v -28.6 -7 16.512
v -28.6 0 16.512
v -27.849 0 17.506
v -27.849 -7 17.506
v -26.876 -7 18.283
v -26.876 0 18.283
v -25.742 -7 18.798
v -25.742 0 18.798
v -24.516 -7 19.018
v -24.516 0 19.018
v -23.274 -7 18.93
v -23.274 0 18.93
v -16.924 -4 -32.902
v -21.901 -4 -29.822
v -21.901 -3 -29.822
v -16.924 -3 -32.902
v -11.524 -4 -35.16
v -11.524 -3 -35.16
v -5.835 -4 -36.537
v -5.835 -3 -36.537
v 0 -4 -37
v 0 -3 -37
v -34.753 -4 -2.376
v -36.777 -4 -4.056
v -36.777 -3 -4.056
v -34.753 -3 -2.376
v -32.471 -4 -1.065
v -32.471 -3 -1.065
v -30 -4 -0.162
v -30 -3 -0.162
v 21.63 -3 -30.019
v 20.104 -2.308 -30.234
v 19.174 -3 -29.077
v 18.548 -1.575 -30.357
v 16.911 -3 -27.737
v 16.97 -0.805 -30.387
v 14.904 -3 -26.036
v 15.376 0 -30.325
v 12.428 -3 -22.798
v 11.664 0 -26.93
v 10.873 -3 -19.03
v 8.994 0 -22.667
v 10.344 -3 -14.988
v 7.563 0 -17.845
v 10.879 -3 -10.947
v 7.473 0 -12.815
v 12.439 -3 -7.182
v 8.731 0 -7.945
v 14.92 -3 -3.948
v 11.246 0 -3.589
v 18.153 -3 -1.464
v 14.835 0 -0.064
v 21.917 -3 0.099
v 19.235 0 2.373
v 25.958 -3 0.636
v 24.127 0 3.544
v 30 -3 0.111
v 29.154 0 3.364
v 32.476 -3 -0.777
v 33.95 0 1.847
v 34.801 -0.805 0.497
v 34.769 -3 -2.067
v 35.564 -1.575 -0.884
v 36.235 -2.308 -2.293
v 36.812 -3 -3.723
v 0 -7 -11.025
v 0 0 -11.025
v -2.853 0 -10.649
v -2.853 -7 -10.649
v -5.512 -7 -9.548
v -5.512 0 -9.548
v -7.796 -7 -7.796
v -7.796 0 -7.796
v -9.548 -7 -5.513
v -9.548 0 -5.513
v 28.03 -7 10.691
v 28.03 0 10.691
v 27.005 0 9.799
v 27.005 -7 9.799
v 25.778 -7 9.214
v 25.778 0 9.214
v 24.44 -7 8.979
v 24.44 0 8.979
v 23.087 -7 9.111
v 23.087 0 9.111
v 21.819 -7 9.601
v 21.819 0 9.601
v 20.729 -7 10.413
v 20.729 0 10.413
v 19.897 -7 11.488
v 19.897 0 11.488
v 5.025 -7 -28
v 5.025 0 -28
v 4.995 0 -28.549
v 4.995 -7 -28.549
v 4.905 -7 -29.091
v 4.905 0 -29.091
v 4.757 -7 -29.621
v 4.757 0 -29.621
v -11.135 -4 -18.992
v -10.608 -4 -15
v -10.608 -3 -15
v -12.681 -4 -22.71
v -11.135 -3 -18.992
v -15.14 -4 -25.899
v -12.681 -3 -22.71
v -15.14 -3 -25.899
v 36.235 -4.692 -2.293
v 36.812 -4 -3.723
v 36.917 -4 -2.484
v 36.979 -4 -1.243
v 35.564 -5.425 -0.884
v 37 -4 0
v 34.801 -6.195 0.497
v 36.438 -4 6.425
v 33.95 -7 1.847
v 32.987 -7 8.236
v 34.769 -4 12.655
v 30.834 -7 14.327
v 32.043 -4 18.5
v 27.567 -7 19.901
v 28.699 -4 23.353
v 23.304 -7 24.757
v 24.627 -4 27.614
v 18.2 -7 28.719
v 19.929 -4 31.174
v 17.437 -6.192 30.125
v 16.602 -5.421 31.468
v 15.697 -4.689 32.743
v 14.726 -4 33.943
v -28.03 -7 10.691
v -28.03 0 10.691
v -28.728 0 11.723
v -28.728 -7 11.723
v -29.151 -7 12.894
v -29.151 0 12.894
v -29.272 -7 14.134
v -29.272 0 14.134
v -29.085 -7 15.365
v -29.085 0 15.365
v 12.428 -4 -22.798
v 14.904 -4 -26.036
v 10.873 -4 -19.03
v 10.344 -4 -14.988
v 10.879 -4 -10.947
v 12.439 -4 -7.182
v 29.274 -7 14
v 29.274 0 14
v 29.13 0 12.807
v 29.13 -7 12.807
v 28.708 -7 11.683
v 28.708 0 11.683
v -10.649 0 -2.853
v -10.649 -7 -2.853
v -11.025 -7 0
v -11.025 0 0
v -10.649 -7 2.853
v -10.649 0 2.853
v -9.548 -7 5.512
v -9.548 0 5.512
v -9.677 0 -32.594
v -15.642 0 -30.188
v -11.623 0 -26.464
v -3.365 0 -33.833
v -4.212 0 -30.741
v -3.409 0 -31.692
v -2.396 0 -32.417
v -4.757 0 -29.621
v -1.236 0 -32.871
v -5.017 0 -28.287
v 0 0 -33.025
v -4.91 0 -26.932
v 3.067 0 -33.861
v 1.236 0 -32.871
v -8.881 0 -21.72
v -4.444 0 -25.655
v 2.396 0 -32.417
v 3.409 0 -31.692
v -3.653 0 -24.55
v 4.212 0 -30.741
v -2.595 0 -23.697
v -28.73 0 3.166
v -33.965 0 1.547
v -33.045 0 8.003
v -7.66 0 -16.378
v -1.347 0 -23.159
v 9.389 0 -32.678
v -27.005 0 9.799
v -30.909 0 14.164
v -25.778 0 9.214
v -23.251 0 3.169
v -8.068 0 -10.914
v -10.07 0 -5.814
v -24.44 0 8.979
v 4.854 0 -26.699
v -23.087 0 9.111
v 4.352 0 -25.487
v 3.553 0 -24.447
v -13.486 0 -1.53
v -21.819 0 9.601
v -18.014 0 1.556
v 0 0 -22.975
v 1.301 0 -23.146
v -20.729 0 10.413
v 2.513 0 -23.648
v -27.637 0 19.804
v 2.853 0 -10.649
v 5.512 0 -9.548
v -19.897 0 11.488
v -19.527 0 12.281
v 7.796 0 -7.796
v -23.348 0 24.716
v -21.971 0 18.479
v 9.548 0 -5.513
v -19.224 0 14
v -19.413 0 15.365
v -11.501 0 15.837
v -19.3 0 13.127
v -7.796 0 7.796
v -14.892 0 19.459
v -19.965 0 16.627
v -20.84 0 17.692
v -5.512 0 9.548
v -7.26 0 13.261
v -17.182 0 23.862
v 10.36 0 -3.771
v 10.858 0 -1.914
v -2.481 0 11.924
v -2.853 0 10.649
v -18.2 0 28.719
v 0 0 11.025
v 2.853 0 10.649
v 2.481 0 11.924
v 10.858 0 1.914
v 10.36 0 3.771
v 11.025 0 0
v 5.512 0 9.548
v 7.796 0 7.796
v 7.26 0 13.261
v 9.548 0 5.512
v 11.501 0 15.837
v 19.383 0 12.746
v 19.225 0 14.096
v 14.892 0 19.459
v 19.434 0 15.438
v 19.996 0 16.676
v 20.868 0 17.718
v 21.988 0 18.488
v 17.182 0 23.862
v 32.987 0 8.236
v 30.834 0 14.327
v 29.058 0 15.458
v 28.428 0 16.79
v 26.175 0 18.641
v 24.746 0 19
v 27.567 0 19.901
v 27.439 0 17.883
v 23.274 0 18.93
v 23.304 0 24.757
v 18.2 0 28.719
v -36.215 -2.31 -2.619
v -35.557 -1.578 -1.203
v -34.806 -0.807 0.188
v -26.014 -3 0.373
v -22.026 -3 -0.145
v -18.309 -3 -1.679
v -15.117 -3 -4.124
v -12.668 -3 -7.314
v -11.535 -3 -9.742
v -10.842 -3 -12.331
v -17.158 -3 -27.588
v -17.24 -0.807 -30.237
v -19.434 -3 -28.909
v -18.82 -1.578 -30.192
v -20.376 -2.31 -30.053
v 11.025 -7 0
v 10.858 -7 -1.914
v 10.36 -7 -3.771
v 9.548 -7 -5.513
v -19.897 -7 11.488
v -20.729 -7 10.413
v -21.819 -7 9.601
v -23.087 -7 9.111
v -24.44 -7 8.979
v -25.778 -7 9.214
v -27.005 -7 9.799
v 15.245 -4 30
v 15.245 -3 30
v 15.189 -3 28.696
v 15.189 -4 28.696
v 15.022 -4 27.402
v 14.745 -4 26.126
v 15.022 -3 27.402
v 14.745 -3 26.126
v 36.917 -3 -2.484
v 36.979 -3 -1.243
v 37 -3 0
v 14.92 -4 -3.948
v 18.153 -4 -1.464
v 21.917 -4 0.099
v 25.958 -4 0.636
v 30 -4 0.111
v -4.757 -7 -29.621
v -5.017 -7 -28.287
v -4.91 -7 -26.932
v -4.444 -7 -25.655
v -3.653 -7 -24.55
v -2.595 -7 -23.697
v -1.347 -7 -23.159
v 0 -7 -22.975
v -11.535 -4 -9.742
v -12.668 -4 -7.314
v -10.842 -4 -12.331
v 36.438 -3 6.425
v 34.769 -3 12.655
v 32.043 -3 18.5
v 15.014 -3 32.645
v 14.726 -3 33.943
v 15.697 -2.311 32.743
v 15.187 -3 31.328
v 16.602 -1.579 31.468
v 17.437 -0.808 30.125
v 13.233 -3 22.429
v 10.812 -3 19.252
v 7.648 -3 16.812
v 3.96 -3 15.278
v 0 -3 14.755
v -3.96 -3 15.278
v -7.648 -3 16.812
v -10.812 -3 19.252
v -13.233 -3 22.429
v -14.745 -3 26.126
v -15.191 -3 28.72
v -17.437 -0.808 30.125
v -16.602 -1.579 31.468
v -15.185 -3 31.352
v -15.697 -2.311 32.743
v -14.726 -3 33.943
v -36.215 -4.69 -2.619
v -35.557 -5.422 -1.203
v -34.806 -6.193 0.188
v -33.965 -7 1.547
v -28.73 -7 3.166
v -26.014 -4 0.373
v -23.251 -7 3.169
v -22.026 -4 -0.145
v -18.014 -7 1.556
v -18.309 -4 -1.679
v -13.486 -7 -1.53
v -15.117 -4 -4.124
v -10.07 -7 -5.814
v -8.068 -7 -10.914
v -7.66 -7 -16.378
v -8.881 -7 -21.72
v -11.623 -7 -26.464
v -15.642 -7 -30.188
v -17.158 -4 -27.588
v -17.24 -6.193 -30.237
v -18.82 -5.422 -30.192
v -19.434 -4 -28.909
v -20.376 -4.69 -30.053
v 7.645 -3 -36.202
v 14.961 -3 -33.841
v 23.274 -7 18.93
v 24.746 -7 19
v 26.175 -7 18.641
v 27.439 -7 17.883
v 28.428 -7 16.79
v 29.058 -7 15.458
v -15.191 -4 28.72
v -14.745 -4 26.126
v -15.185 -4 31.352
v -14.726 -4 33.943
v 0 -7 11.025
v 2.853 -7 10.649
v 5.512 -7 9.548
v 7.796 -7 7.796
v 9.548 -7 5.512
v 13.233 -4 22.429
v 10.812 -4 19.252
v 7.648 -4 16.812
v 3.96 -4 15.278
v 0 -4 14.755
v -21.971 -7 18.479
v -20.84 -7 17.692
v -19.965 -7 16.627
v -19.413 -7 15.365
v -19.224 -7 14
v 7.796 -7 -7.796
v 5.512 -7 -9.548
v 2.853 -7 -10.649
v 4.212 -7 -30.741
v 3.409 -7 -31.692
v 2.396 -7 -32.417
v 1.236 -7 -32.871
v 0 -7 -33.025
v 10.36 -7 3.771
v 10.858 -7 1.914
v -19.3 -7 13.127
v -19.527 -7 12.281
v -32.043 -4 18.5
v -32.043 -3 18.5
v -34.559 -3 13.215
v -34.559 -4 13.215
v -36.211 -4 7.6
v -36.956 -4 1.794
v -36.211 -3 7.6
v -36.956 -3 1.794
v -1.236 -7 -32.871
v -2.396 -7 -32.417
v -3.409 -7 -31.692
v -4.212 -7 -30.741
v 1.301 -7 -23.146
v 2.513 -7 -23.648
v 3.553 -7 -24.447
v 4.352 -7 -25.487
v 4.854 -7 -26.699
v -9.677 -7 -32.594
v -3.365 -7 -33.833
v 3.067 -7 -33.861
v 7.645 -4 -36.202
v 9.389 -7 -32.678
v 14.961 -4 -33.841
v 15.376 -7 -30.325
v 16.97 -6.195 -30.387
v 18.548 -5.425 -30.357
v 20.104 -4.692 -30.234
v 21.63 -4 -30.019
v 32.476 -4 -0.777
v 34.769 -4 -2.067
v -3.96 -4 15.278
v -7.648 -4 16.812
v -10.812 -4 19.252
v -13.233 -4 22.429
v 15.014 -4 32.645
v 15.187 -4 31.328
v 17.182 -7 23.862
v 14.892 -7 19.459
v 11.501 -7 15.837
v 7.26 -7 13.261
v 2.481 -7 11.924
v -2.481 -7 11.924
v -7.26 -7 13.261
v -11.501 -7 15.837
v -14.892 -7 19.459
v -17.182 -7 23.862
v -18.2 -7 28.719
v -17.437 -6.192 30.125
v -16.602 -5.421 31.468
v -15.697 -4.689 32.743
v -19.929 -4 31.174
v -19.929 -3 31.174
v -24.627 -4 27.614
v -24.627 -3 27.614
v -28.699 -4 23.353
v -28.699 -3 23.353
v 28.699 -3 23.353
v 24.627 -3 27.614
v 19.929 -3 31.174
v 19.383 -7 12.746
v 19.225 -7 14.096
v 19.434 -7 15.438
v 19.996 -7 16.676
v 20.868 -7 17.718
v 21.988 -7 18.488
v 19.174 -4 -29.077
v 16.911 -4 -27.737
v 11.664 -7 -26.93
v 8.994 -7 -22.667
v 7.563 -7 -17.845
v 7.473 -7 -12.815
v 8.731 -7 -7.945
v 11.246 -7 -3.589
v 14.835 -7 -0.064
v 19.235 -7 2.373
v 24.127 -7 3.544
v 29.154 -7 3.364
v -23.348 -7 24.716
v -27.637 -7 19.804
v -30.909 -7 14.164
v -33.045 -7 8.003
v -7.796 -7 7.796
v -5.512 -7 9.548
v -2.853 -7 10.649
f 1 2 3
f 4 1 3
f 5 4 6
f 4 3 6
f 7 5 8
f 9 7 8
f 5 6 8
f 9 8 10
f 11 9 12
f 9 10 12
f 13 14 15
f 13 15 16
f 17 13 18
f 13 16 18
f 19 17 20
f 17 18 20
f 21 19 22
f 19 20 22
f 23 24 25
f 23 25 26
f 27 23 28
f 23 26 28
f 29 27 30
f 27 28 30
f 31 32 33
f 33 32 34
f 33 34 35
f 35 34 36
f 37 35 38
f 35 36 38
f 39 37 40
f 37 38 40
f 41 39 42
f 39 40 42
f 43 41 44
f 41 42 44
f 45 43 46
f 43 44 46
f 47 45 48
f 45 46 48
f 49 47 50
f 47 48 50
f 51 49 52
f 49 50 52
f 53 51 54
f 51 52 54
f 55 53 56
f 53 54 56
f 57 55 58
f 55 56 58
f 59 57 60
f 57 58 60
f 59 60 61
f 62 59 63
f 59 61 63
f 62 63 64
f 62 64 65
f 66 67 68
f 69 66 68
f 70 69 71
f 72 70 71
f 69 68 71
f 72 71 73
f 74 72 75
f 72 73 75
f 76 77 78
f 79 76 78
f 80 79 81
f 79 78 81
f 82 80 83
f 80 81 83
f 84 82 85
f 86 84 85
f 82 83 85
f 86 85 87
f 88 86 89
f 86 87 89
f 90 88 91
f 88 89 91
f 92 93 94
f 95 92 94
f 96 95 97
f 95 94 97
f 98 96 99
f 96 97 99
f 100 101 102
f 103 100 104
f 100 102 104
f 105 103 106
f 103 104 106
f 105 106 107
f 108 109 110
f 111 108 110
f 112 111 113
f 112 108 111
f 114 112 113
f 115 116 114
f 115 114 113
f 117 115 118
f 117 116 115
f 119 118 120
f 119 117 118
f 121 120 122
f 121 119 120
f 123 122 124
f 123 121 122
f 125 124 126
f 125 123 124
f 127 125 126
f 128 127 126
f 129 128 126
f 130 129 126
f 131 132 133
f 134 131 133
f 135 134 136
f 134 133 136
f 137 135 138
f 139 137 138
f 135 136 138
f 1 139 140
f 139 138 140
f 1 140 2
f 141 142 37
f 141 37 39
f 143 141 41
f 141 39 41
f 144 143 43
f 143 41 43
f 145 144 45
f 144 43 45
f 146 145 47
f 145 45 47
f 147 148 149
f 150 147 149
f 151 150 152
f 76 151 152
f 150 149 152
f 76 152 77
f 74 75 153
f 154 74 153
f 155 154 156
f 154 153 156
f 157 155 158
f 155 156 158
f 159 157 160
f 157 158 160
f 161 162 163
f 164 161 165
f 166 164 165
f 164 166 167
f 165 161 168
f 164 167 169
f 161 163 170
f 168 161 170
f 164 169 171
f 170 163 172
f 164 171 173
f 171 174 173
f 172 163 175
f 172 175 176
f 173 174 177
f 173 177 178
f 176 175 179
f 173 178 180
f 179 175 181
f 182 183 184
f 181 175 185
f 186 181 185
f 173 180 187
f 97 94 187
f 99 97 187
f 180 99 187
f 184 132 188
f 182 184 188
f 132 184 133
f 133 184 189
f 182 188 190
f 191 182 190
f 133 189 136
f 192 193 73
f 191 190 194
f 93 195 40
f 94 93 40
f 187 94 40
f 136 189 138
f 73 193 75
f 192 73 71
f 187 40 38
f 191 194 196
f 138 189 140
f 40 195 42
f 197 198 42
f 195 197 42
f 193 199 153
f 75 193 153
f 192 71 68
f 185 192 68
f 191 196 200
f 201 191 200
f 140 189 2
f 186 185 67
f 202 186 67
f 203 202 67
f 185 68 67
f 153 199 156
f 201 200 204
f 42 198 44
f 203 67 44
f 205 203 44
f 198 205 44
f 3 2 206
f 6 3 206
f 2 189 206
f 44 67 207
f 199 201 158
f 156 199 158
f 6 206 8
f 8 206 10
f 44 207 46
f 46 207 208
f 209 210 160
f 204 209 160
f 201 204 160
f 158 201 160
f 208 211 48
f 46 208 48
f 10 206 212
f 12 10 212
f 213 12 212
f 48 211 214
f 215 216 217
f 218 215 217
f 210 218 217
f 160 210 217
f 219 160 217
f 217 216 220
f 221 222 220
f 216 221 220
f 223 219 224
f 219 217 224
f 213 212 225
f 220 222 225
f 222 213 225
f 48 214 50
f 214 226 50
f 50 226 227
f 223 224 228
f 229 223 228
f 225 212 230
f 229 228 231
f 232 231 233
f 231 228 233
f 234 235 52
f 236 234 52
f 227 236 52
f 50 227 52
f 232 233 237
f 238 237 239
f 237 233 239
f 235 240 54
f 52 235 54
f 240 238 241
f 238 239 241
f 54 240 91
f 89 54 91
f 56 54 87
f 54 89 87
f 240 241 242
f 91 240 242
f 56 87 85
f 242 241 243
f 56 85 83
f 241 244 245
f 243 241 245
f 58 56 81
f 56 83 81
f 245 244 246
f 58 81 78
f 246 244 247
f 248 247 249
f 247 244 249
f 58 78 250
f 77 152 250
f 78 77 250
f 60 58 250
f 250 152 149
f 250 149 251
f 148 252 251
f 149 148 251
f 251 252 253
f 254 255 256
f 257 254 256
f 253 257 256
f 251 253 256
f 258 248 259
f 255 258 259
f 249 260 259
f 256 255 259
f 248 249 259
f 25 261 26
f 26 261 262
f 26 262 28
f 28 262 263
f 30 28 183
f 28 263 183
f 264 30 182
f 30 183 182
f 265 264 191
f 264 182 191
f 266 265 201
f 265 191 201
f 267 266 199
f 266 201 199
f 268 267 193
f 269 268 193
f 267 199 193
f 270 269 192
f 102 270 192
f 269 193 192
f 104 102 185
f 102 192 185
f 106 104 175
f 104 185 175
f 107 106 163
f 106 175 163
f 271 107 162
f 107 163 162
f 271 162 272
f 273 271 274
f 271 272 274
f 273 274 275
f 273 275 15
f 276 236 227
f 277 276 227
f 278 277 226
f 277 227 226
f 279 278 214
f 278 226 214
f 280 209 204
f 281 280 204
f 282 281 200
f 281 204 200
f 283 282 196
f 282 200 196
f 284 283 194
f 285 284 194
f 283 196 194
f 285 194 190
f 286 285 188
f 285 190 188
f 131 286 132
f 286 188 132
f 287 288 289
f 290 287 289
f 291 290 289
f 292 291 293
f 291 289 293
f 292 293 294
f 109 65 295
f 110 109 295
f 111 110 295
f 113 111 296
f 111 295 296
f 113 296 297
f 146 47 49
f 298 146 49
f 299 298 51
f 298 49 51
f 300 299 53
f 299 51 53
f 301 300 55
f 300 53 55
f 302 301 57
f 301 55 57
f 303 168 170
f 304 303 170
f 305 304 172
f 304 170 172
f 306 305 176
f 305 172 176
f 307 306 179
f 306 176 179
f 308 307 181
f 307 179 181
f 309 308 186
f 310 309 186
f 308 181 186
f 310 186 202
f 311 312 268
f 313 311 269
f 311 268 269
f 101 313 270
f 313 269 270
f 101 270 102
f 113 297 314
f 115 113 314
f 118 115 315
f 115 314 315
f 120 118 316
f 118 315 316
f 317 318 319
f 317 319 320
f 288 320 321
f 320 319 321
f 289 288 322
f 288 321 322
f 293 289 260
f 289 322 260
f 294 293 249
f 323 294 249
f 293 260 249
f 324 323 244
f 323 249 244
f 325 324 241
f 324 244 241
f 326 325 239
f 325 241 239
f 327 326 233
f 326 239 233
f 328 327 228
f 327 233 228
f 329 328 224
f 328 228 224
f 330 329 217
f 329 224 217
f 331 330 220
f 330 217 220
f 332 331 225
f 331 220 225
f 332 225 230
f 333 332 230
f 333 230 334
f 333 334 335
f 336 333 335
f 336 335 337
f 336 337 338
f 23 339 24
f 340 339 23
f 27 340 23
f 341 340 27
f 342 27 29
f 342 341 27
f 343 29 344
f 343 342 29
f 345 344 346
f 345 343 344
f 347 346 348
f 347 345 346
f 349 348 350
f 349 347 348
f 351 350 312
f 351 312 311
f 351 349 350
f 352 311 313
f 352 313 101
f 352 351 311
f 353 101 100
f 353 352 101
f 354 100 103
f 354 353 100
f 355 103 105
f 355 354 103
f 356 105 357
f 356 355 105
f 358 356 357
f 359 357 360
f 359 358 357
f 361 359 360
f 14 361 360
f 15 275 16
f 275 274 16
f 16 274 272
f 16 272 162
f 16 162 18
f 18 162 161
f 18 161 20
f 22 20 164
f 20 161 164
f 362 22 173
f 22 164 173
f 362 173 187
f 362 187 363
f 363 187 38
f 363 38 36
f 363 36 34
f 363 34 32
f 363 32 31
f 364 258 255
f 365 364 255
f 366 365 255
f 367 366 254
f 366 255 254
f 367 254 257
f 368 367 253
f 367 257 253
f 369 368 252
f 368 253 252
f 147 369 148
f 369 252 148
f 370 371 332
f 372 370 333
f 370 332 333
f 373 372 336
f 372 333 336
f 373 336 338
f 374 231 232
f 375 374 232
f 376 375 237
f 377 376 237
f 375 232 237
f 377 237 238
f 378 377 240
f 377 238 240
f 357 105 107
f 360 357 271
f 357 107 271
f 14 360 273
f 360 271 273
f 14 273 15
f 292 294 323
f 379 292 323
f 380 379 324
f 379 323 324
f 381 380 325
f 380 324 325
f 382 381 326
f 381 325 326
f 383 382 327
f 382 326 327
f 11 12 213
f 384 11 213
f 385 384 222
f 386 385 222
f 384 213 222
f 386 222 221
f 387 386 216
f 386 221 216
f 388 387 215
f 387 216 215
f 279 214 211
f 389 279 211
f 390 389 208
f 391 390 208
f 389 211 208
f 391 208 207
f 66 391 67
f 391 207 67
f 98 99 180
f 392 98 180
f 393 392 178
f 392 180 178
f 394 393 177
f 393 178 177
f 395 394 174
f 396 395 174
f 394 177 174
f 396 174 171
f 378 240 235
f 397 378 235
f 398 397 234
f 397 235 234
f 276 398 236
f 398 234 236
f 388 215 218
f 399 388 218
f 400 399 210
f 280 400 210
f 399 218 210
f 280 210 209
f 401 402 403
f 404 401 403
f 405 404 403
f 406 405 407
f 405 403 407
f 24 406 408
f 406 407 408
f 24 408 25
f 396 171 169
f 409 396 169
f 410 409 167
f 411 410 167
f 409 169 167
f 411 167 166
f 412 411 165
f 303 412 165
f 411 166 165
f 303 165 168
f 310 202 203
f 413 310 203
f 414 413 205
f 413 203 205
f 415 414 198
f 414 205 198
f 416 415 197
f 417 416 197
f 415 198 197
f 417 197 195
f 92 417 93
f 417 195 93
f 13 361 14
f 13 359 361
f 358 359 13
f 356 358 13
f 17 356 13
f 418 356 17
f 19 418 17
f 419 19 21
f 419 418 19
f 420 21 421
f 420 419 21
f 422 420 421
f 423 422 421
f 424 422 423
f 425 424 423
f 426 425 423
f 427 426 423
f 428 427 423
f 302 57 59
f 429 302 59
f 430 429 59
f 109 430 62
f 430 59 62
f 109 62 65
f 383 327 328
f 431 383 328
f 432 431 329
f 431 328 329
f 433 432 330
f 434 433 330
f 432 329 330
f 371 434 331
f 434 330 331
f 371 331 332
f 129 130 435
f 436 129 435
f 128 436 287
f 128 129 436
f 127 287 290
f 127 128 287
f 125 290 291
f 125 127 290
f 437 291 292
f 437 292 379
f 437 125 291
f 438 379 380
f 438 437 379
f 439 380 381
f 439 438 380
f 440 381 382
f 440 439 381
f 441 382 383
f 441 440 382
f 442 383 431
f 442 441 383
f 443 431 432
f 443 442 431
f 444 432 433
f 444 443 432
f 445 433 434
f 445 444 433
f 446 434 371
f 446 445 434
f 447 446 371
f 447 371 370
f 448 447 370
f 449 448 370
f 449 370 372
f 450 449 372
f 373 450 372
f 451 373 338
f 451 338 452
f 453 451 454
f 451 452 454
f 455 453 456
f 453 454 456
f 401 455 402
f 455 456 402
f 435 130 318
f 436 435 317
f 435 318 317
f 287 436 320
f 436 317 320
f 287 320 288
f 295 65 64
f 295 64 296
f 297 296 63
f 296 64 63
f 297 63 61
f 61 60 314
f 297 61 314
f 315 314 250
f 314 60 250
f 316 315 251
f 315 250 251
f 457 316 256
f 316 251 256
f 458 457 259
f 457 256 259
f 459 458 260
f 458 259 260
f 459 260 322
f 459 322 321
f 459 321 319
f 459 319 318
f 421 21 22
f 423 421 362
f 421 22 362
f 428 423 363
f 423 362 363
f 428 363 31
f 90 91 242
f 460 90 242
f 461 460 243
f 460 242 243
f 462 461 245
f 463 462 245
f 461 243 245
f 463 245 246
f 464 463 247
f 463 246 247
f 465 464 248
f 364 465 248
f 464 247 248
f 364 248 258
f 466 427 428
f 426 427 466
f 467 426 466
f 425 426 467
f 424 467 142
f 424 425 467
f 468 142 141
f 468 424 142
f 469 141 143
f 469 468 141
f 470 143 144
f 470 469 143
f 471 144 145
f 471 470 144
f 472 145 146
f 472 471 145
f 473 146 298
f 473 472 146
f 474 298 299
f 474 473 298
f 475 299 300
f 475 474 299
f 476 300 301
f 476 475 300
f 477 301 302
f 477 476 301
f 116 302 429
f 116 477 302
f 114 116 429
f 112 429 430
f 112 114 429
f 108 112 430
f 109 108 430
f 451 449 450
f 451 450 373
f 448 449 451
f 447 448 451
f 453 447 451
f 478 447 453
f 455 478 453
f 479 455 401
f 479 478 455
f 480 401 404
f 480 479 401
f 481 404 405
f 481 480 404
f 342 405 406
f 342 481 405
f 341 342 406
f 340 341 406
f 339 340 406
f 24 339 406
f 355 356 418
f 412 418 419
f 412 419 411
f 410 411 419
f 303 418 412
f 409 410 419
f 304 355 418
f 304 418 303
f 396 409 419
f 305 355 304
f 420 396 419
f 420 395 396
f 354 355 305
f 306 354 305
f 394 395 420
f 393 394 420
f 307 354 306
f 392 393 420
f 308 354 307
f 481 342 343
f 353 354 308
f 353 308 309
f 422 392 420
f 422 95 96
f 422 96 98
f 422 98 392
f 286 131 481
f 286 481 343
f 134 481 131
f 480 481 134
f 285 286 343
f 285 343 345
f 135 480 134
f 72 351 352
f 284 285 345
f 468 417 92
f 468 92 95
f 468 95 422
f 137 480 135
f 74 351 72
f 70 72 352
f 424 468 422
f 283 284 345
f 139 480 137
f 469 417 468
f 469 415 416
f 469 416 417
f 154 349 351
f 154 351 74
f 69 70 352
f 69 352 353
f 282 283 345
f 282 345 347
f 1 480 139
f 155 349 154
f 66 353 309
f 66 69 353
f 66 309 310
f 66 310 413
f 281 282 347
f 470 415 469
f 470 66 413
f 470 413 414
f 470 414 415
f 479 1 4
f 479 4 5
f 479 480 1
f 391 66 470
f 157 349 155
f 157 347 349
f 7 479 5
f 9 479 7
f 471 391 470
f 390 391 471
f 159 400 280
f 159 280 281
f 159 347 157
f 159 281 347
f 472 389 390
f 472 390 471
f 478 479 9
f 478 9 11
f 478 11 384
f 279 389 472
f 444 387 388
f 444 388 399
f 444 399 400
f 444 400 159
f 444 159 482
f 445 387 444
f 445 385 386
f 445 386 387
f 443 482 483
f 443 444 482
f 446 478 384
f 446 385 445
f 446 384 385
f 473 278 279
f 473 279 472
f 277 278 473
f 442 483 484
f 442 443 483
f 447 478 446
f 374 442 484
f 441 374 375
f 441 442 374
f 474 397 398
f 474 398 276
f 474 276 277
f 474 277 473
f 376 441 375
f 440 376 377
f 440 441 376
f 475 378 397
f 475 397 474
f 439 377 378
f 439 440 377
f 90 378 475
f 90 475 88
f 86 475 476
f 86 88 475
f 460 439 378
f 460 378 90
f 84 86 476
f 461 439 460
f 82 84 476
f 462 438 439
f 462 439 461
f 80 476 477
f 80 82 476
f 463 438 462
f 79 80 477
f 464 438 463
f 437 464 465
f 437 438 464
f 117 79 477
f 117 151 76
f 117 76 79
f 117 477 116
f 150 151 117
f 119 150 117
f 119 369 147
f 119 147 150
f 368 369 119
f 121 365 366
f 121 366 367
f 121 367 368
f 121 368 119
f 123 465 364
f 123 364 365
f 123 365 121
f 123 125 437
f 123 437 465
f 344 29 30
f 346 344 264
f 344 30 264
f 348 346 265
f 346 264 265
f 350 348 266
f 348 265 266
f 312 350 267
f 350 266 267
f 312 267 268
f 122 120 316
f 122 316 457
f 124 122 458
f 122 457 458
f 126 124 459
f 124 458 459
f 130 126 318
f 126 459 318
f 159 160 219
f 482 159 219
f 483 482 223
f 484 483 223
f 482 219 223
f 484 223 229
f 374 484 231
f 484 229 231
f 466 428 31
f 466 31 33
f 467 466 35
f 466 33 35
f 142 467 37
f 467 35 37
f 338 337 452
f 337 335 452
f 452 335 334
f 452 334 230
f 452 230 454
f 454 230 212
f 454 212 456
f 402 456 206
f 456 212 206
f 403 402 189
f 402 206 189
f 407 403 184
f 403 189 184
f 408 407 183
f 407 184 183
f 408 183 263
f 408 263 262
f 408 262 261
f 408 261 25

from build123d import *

# Parameters (mm, degrees)
F1_DEPTH     = 7
F2_T2_ANGLE  = 96.7405372454
F2_T4_ANGLE  = 266.8582437325
F2_T6_ANGLE  = 95.969109219
F2_T8_ANGLE  = 264.3512540772
F2_T10_ANGLE = 268.0965177518
F2_T12_ANGLE = 96.2209043171
F2_T14_ANGLE = 96.2209043171
F2_T16_ANGLE = 264.3512540772
F2_T18_ANGLE = 95.969109219
F2_T20_ANGLE = 266.8582437325
F2_T22_ANGLE = 96.7405372454
F2_T24_ANGLE = 268.0965177518


# Not quite as in the source:
# - a fillet or chamfer that OpenCascade refuses, or shapes differently, is made with other operations: its cross-section is extruded or revolved along the edge and cut away or added


with BuildPart() as f1:
    # F0 (on Front) → F1 (new body)
    with BuildSketch(Plane.XZ):
        with BuildLine():
            Line((-28.60048896, 16.5125), (-32.04293994, 18.5))
            ThreePointArc((-32.04293994, 18.5), (-36.2110940276, 7.5997808734), (-36.7769641036, -4.0564653732))
            ThreePointArc((-36.7769641036, -4.0564653732), (-33.6399342951, -1.6712337769), (-29.9995629467, -0.1619351868))
            ThreePointArc((-29.9995629467, -0.1619351868), (-29.5180509711, 5.3558068364), (-28.030388979, 10.6909912395))
            ThreePointArc((-28.030388979, 10.6909912395), (-29.2497876853, 13.5102449097), (-28.60048896, 16.5125))
        make_face()
        with BuildLine():
            ThreePointArc((-28.030388979, 10.6909912395), (-29.5180509711, 5.3558068364), (-29.9995629467, -0.1619351868))
            ThreePointArc((-29.9995629467, -0.1619351868), (-20.1170678219, -0.7895806962), (-12.6676409298, -7.3136659008))
            Line((-12.6676409298, -7.3136659008), (-9.5479300767, -5.5125))
            ThreePointArc((-9.5479300767, -5.5125), (-11.025, 0), (-9.5479300767, 5.5125))
            Line((-9.5479300767, 5.5125), (-19.8969336519, 11.4875))
            ThreePointArc((-19.8969336519, 11.4875), (-23.7589562157, 8.9989236207), (-28.030388979, 10.6909912395))
        make_face()
        with BuildLine():
            ThreePointArc((0, 14.7547752324), (-9.310283358, 17.9279039927), (-14.7448970108, 26.1263853631))
            ThreePointArc((-14.7448970108, 26.1263853631), (-19.3469694385, 22.9280346638), (-23.2738644946, 18.9295333141))
            ThreePointArc((-23.2738644946, 18.9295333141), (-20.3661071395, 17.1899858756), (-19.223711306, 14))
            ThreePointArc((-19.223711306, 14), (-19.3949340289, 12.6994342984), (-19.8969336519, 11.4875))
            Line((-19.8969336519, 11.4875), (-9.5479300767, 5.5125))
            ThreePointArc((-9.5479300767, 5.5125), (-5.5125, 9.5479300767), (0, 11.025))
            Line((0, 11.025), (0, 14.7547752324))
        make_face()
        with BuildLine():
            ThreePointArc((-14.7448970108, 26.1263853631), (-15.2451824532, 30.0359191128), (-14.726480194, 33.9430520298))
            ThreePointArc((-14.726480194, 33.9430520298), (-24.6265431784, 27.6140067915), (-32.04293994, 18.5))
            Line((-32.04293994, 18.5), (-28.60048896, 16.5125))
            ThreePointArc((-28.60048896, 16.5125), (-26.3251091458, 18.5759367359), (-23.2738644946, 18.9295333141))
            ThreePointArc((-23.2738644946, 18.9295333141), (-19.3469694385, 22.9280346638), (-14.7448970108, 26.1263853631))
        make_face()
        with BuildLine():
            ThreePointArc((19.8969336519, 11.4875), (19.6727745701, 16.0763978398), (23.2738644946, 18.9295333141))
            ThreePointArc((23.2738644946, 18.9295333141), (19.3469694385, 22.9280346638), (14.7448970108, 26.1263853631))
            ThreePointArc((14.7448970108, 26.1263853631), (9.310283358, 17.9279039927), (0, 14.7547752324))
            Line((0, 14.7547752324), (0, 11.025))
            ThreePointArc((0, 11.025), (5.5125, 9.5479300767), (9.5479300767, 5.5125))
            Line((9.5479300767, 5.5125), (19.8969336519, 11.4875))
        make_face()
        with BuildLine():
            Line((28.60048896, 16.5125), (32.04293994, 18.5))
            ThreePointArc((32.04293994, 18.5), (24.6265431784, 27.6140067915), (14.726480194, 33.9430520298))
            ThreePointArc((14.726480194, 33.9430520298), (15.1149822826, 31.9885142218), (15.2452247676, 30))
            ThreePointArc((15.2452247676, 30), (15.1196254471, 28.0471035473), (14.7448970108, 26.1263853631))
            ThreePointArc((14.7448970108, 26.1263853631), (19.3469694385, 22.9280346638), (23.2738644946, 18.9295333141))
            ThreePointArc((23.2738644946, 18.9295333141), (26.3251091458, 18.5759367359), (28.60048896, 16.5125))
        make_face()
        with BuildLine():
            ThreePointArc((36.8122346311, -3.7228190211), (36.9530288431, -1.8637755563), (37, 0))
            ThreePointArc((37, 0), (35.7392555727, 9.5763046688), (32.04293994, 18.5))
            Line((32.04293994, 18.5), (28.60048896, 16.5125))
            ThreePointArc((28.60048896, 16.5125), (29.1024885831, 15.3005657016), (29.273711306, 14))
            ThreePointArc((29.273711306, 14), (28.9526221952, 12.2325590968), (28.030388979, 10.6909912395))
            ThreePointArc((28.030388979, 10.6909912395), (29.4933804082, 5.4900375314), (29.9997945679, 0.1110219992))
            ThreePointArc((29.9997945679, 0.1110219992), (33.6494620505, -1.3733111503), (36.8122346311, -3.7228190211))
        make_face()
        with BuildLine():
            ThreePointArc((12.4392811828, -7.1818223394), (19.983625223, -0.5594336383), (29.9997945679, 0.1110219992))
            ThreePointArc((29.9997945679, 0.1110219992), (29.4933804082, 5.4900375314), (28.030388979, 10.6909912395))
            ThreePointArc((28.030388979, 10.6909912395), (23.7589562157, 8.9989236207), (19.8969336519, 11.4875))
            Line((19.8969336519, 11.4875), (9.5479300767, 5.5125))
            ThreePointArc((9.5479300767, 5.5125), (10.6493322348, 2.8534799723), (11.025, 0))
            ThreePointArc((11.025, 0), (10.6493322348, -2.8534799723), (9.5479300767, -5.5125))
            Line((9.5479300767, -5.5125), (12.4392811828, -7.1818223394))
        make_face()
        with BuildLine():
            ThreePointArc((4.7565244845, -29.6205245536), (9.9921782342, -28.2870354427), (14.9037494122, -26.0360952037))
            ThreePointArc((14.9037494122, -26.0360952037), (10.476296354, -17.0266102837), (12.4392811828, -7.1818223394))
            Line((12.4392811828, -7.1818223394), (9.5479300767, -5.5125))
            ThreePointArc((9.5479300767, -5.5125), (5.5125, -9.5479300767), (0, -11.025))
            Line((0, -11.025), (0, -22.975))
            ThreePointArc((0, -22.975), (3.5532115755, -24.4467884245), (5.025, -28))
            ThreePointArc((5.025, -28), (4.9574267788, -28.8213067227), (4.7565244845, -29.6205245536))
        make_face()
        with BuildLine():
            ThreePointArc((-10.6080939152, -15), (-11.7862202639, -20.9020258568), (-15.1400214589, -25.8994160209))
            ThreePointArc((-15.1400214589, -25.8994160209), (-10.1207607074, -28.2412854294), (-4.7565244845, -29.6205245536))
            ThreePointArc((-4.7565244845, -29.6205245536), (-4.0861816456, -25.0753214605), (0, -22.975))
            Line((0, -22.975), (0, -11.025))
            ThreePointArc((0, -11.025), (-5.5125, -9.5479300767), (-9.5479300767, -5.5125))
            Line((-9.5479300767, -5.5125), (-12.6676409298, -7.3136659008))
            ThreePointArc((-12.6676409298, -7.3136659008), (-11.1319048818, -11.0212606962), (-10.6080939152, -15))
        make_face()
        with BuildLine():
            ThreePointArc((-21.9014841146, -29.8215525011), (-11.5239437142, -35.1596177634), (0, -37))
            Line((0, -37), (0, -33.025))
            ThreePointArc((0, -33.025), (-2.9246785395, -32.0861816456), (-4.7565244845, -29.6205245536))
            ThreePointArc((-4.7565244845, -29.6205245536), (-10.1207607074, -28.2412854294), (-15.1400214589, -25.8994160209))
            ThreePointArc((-15.1400214589, -25.8994160209), (-18.267298054, -28.2974207927), (-21.9014841146, -29.8215525011))
        make_face()
        with BuildLine():
            ThreePointArc((0, -37), (11.3644165831, -35.2115043093), (21.6301731615, -30.0189208501))
            ThreePointArc((21.6301731615, -30.0189208501), (18.0140533687, -28.4546333842), (14.9037494122, -26.0360952037))
            ThreePointArc((14.9037494122, -26.0360952037), (9.9921782342, -28.2870354427), (4.7565244845, -29.6205245536))
            ThreePointArc((4.7565244845, -29.6205245536), (2.9246785395, -32.0861816456), (0, -33.025))
            Line((0, -33.025), (0, -37))
        make_face()
    extrude(amount=F1_DEPTH)

    # F2: chamfer of 3 on 12 edges, made by hand

    # F2_s1 → F2_t2 (revolve, cut)
    with BuildSketch(Plane(origin=(0, 0, 0), x_dir=(0, 1, 0), z_dir=(0.9799112872, 0, 0.199433872))):
        Polygon((-4, 37), (-7, 34), (-7, 37), align=None)
    revolve(axis=Axis((0, -7, 0), (0, -1, 0)), revolution_arc=F2_T2_ANGLE, mode=Mode.SUBTRACT)

    # F2_s3 → F2_t4 (revolve, cut)
    with BuildSketch(Plane(origin=(-6.2136111397, 0, -20.8819053013), x_dir=(0, 1, 0), z_dir=(-0.2852012416, 0, -0.9584676582))):
        Polygon((-4, -35.9963697961), (-7, -38.9963697961), (-7, -35.9963697961), align=None)
    revolve(axis=Axis((-25.9807621135, -7, -15), (0, 1, 0)), revolution_arc=F2_T4_ANGLE, mode=Mode.SUBTRACT)

    # F2_s5 → F2_t6 (revolve, cut)
    with BuildSketch(Plane(origin=(0, 0, 0), x_dir=(0, 1, 0), z_dir=(-0.6659555398, 0, 0.7459914336))):
        Polygon((-4, 37), (-7, 34), (-7, 37), align=None)
    revolve(axis=Axis((0, -7, 0), (0, -1, 0)), revolution_arc=F2_T6_ANGLE, mode=Mode.SUBTRACT)

    # F2_s7 → F2_t8 (revolve, cut)
    with BuildSketch(Plane(origin=(21.7325989573, 0, 4.6890781514), x_dir=(0, 1, 0), z_dir=(0.977505701, 0, 0.2109089959))):
        Polygon((-4, -35.7785172869), (-7, -38.7785172869), (-7, -35.7785172869), align=None)
    revolve(axis=Axis((25.9807621135, -7, -15), (0, 1, 0)), revolution_arc=F2_T8_ANGLE, mode=Mode.SUBTRACT)

    # F2_s9 → F2_t10 (revolve, cut)
    with BuildSketch(Plane(origin=(-14.9917229855, 0, 15.4982388241), x_dir=(0, 1, 0), z_dir=(-0.6952640068, 0, 0.718754451))):
        Polygon((-4, -36.1031449725), (-7, -39.1031449725), (-7, -36.1031449725), align=None)
    revolve(axis=Axis((0, -7, 30), (0, 1, 0)), revolution_arc=F2_T10_ANGLE, mode=Mode.SUBTRACT)

    # F2_s11 → F2_t12 (revolve, cut)
    with BuildSketch(Plane(origin=(0, 0, 0), x_dir=(0, 1, 0), z_dir=(-0.3044454567, 0, -0.9525297706))):
        Polygon((-4, 37), (-7, 34), (-7, 37), align=None)
    revolve(axis=Axis((0, -7, 0), (0, -1, 0)), revolution_arc=F2_T12_ANGLE, mode=Mode.SUBTRACT)

    # F2_s13 → F2_t14 (revolve, cut)
    with BuildSketch(Plane(origin=(0, 0, 0), x_dir=(0, 1, 0), z_dir=(-0.3044454567, 0, -0.9525297706))):
        Polygon((-3, 37), (0, 34), (0, 37), align=None)
    revolve(axis=Axis((0, 0, 0), (0, -1, 0)), revolution_arc=F2_T14_ANGLE, mode=Mode.SUBTRACT)

    # F2_s15 → F2_t16 (revolve, cut)
    with BuildSketch(Plane(origin=(21.7325989573, 0, 4.6890781514), x_dir=(0, 1, 0), z_dir=(0.977505701, 0, 0.2109089959))):
        Polygon((-3, -35.7785172869), (0, -38.7785172869), (0, -35.7785172869), align=None)
    revolve(axis=Axis((25.9807621135, 0, -15), (0, 1, 0)), revolution_arc=F2_T16_ANGLE, mode=Mode.SUBTRACT)

    # F2_s17 → F2_t18 (revolve, cut)
    with BuildSketch(Plane(origin=(0, 0, 0), x_dir=(0, 1, 0), z_dir=(-0.6659555398, 0, 0.7459914336))):
        Polygon((-3, 37), (0, 34), (0, 37), align=None)
    revolve(axis=Axis((0, 0, 0), (0, -1, 0)), revolution_arc=F2_T18_ANGLE, mode=Mode.SUBTRACT)

    # F2_s19 → F2_t20 (revolve, cut)
    with BuildSketch(Plane(origin=(-6.2136111397, 0, -20.8819053013), x_dir=(0, 1, 0), z_dir=(-0.2852012416, 0, -0.9584676582))):
        Polygon((-3, -35.9963697961), (0, -38.9963697961), (0, -35.9963697961), align=None)
    revolve(axis=Axis((-25.9807621135, 0, -15), (0, 1, 0)), revolution_arc=F2_T20_ANGLE, mode=Mode.SUBTRACT)

    # F2_s21 → F2_t22 (revolve, cut)
    with BuildSketch(Plane(origin=(0, 0, 0), x_dir=(0, 1, 0), z_dir=(0.9799112872, 0, 0.199433872))):
        Polygon((-3, 37), (0, 34), (0, 37), align=None)
    revolve(axis=Axis((0, 0, 0), (0, -1, 0)), revolution_arc=F2_T22_ANGLE, mode=Mode.SUBTRACT)

    # F2_s23 → F2_t24 (revolve, cut)
    with BuildSketch(Plane(origin=(-14.9917229855, 0, 15.4982388241), x_dir=(0, 1, 0), z_dir=(-0.6952640068, 0, 0.718754451))):
        Polygon((-3, -36.1031449725), (0, -39.1031449725), (0, -36.1031449725), align=None)
    revolve(axis=Axis((0, 0, 30), (0, 1, 0)), revolution_arc=F2_T24_ANGLE, mode=Mode.SUBTRACT)


solid = f1.part
